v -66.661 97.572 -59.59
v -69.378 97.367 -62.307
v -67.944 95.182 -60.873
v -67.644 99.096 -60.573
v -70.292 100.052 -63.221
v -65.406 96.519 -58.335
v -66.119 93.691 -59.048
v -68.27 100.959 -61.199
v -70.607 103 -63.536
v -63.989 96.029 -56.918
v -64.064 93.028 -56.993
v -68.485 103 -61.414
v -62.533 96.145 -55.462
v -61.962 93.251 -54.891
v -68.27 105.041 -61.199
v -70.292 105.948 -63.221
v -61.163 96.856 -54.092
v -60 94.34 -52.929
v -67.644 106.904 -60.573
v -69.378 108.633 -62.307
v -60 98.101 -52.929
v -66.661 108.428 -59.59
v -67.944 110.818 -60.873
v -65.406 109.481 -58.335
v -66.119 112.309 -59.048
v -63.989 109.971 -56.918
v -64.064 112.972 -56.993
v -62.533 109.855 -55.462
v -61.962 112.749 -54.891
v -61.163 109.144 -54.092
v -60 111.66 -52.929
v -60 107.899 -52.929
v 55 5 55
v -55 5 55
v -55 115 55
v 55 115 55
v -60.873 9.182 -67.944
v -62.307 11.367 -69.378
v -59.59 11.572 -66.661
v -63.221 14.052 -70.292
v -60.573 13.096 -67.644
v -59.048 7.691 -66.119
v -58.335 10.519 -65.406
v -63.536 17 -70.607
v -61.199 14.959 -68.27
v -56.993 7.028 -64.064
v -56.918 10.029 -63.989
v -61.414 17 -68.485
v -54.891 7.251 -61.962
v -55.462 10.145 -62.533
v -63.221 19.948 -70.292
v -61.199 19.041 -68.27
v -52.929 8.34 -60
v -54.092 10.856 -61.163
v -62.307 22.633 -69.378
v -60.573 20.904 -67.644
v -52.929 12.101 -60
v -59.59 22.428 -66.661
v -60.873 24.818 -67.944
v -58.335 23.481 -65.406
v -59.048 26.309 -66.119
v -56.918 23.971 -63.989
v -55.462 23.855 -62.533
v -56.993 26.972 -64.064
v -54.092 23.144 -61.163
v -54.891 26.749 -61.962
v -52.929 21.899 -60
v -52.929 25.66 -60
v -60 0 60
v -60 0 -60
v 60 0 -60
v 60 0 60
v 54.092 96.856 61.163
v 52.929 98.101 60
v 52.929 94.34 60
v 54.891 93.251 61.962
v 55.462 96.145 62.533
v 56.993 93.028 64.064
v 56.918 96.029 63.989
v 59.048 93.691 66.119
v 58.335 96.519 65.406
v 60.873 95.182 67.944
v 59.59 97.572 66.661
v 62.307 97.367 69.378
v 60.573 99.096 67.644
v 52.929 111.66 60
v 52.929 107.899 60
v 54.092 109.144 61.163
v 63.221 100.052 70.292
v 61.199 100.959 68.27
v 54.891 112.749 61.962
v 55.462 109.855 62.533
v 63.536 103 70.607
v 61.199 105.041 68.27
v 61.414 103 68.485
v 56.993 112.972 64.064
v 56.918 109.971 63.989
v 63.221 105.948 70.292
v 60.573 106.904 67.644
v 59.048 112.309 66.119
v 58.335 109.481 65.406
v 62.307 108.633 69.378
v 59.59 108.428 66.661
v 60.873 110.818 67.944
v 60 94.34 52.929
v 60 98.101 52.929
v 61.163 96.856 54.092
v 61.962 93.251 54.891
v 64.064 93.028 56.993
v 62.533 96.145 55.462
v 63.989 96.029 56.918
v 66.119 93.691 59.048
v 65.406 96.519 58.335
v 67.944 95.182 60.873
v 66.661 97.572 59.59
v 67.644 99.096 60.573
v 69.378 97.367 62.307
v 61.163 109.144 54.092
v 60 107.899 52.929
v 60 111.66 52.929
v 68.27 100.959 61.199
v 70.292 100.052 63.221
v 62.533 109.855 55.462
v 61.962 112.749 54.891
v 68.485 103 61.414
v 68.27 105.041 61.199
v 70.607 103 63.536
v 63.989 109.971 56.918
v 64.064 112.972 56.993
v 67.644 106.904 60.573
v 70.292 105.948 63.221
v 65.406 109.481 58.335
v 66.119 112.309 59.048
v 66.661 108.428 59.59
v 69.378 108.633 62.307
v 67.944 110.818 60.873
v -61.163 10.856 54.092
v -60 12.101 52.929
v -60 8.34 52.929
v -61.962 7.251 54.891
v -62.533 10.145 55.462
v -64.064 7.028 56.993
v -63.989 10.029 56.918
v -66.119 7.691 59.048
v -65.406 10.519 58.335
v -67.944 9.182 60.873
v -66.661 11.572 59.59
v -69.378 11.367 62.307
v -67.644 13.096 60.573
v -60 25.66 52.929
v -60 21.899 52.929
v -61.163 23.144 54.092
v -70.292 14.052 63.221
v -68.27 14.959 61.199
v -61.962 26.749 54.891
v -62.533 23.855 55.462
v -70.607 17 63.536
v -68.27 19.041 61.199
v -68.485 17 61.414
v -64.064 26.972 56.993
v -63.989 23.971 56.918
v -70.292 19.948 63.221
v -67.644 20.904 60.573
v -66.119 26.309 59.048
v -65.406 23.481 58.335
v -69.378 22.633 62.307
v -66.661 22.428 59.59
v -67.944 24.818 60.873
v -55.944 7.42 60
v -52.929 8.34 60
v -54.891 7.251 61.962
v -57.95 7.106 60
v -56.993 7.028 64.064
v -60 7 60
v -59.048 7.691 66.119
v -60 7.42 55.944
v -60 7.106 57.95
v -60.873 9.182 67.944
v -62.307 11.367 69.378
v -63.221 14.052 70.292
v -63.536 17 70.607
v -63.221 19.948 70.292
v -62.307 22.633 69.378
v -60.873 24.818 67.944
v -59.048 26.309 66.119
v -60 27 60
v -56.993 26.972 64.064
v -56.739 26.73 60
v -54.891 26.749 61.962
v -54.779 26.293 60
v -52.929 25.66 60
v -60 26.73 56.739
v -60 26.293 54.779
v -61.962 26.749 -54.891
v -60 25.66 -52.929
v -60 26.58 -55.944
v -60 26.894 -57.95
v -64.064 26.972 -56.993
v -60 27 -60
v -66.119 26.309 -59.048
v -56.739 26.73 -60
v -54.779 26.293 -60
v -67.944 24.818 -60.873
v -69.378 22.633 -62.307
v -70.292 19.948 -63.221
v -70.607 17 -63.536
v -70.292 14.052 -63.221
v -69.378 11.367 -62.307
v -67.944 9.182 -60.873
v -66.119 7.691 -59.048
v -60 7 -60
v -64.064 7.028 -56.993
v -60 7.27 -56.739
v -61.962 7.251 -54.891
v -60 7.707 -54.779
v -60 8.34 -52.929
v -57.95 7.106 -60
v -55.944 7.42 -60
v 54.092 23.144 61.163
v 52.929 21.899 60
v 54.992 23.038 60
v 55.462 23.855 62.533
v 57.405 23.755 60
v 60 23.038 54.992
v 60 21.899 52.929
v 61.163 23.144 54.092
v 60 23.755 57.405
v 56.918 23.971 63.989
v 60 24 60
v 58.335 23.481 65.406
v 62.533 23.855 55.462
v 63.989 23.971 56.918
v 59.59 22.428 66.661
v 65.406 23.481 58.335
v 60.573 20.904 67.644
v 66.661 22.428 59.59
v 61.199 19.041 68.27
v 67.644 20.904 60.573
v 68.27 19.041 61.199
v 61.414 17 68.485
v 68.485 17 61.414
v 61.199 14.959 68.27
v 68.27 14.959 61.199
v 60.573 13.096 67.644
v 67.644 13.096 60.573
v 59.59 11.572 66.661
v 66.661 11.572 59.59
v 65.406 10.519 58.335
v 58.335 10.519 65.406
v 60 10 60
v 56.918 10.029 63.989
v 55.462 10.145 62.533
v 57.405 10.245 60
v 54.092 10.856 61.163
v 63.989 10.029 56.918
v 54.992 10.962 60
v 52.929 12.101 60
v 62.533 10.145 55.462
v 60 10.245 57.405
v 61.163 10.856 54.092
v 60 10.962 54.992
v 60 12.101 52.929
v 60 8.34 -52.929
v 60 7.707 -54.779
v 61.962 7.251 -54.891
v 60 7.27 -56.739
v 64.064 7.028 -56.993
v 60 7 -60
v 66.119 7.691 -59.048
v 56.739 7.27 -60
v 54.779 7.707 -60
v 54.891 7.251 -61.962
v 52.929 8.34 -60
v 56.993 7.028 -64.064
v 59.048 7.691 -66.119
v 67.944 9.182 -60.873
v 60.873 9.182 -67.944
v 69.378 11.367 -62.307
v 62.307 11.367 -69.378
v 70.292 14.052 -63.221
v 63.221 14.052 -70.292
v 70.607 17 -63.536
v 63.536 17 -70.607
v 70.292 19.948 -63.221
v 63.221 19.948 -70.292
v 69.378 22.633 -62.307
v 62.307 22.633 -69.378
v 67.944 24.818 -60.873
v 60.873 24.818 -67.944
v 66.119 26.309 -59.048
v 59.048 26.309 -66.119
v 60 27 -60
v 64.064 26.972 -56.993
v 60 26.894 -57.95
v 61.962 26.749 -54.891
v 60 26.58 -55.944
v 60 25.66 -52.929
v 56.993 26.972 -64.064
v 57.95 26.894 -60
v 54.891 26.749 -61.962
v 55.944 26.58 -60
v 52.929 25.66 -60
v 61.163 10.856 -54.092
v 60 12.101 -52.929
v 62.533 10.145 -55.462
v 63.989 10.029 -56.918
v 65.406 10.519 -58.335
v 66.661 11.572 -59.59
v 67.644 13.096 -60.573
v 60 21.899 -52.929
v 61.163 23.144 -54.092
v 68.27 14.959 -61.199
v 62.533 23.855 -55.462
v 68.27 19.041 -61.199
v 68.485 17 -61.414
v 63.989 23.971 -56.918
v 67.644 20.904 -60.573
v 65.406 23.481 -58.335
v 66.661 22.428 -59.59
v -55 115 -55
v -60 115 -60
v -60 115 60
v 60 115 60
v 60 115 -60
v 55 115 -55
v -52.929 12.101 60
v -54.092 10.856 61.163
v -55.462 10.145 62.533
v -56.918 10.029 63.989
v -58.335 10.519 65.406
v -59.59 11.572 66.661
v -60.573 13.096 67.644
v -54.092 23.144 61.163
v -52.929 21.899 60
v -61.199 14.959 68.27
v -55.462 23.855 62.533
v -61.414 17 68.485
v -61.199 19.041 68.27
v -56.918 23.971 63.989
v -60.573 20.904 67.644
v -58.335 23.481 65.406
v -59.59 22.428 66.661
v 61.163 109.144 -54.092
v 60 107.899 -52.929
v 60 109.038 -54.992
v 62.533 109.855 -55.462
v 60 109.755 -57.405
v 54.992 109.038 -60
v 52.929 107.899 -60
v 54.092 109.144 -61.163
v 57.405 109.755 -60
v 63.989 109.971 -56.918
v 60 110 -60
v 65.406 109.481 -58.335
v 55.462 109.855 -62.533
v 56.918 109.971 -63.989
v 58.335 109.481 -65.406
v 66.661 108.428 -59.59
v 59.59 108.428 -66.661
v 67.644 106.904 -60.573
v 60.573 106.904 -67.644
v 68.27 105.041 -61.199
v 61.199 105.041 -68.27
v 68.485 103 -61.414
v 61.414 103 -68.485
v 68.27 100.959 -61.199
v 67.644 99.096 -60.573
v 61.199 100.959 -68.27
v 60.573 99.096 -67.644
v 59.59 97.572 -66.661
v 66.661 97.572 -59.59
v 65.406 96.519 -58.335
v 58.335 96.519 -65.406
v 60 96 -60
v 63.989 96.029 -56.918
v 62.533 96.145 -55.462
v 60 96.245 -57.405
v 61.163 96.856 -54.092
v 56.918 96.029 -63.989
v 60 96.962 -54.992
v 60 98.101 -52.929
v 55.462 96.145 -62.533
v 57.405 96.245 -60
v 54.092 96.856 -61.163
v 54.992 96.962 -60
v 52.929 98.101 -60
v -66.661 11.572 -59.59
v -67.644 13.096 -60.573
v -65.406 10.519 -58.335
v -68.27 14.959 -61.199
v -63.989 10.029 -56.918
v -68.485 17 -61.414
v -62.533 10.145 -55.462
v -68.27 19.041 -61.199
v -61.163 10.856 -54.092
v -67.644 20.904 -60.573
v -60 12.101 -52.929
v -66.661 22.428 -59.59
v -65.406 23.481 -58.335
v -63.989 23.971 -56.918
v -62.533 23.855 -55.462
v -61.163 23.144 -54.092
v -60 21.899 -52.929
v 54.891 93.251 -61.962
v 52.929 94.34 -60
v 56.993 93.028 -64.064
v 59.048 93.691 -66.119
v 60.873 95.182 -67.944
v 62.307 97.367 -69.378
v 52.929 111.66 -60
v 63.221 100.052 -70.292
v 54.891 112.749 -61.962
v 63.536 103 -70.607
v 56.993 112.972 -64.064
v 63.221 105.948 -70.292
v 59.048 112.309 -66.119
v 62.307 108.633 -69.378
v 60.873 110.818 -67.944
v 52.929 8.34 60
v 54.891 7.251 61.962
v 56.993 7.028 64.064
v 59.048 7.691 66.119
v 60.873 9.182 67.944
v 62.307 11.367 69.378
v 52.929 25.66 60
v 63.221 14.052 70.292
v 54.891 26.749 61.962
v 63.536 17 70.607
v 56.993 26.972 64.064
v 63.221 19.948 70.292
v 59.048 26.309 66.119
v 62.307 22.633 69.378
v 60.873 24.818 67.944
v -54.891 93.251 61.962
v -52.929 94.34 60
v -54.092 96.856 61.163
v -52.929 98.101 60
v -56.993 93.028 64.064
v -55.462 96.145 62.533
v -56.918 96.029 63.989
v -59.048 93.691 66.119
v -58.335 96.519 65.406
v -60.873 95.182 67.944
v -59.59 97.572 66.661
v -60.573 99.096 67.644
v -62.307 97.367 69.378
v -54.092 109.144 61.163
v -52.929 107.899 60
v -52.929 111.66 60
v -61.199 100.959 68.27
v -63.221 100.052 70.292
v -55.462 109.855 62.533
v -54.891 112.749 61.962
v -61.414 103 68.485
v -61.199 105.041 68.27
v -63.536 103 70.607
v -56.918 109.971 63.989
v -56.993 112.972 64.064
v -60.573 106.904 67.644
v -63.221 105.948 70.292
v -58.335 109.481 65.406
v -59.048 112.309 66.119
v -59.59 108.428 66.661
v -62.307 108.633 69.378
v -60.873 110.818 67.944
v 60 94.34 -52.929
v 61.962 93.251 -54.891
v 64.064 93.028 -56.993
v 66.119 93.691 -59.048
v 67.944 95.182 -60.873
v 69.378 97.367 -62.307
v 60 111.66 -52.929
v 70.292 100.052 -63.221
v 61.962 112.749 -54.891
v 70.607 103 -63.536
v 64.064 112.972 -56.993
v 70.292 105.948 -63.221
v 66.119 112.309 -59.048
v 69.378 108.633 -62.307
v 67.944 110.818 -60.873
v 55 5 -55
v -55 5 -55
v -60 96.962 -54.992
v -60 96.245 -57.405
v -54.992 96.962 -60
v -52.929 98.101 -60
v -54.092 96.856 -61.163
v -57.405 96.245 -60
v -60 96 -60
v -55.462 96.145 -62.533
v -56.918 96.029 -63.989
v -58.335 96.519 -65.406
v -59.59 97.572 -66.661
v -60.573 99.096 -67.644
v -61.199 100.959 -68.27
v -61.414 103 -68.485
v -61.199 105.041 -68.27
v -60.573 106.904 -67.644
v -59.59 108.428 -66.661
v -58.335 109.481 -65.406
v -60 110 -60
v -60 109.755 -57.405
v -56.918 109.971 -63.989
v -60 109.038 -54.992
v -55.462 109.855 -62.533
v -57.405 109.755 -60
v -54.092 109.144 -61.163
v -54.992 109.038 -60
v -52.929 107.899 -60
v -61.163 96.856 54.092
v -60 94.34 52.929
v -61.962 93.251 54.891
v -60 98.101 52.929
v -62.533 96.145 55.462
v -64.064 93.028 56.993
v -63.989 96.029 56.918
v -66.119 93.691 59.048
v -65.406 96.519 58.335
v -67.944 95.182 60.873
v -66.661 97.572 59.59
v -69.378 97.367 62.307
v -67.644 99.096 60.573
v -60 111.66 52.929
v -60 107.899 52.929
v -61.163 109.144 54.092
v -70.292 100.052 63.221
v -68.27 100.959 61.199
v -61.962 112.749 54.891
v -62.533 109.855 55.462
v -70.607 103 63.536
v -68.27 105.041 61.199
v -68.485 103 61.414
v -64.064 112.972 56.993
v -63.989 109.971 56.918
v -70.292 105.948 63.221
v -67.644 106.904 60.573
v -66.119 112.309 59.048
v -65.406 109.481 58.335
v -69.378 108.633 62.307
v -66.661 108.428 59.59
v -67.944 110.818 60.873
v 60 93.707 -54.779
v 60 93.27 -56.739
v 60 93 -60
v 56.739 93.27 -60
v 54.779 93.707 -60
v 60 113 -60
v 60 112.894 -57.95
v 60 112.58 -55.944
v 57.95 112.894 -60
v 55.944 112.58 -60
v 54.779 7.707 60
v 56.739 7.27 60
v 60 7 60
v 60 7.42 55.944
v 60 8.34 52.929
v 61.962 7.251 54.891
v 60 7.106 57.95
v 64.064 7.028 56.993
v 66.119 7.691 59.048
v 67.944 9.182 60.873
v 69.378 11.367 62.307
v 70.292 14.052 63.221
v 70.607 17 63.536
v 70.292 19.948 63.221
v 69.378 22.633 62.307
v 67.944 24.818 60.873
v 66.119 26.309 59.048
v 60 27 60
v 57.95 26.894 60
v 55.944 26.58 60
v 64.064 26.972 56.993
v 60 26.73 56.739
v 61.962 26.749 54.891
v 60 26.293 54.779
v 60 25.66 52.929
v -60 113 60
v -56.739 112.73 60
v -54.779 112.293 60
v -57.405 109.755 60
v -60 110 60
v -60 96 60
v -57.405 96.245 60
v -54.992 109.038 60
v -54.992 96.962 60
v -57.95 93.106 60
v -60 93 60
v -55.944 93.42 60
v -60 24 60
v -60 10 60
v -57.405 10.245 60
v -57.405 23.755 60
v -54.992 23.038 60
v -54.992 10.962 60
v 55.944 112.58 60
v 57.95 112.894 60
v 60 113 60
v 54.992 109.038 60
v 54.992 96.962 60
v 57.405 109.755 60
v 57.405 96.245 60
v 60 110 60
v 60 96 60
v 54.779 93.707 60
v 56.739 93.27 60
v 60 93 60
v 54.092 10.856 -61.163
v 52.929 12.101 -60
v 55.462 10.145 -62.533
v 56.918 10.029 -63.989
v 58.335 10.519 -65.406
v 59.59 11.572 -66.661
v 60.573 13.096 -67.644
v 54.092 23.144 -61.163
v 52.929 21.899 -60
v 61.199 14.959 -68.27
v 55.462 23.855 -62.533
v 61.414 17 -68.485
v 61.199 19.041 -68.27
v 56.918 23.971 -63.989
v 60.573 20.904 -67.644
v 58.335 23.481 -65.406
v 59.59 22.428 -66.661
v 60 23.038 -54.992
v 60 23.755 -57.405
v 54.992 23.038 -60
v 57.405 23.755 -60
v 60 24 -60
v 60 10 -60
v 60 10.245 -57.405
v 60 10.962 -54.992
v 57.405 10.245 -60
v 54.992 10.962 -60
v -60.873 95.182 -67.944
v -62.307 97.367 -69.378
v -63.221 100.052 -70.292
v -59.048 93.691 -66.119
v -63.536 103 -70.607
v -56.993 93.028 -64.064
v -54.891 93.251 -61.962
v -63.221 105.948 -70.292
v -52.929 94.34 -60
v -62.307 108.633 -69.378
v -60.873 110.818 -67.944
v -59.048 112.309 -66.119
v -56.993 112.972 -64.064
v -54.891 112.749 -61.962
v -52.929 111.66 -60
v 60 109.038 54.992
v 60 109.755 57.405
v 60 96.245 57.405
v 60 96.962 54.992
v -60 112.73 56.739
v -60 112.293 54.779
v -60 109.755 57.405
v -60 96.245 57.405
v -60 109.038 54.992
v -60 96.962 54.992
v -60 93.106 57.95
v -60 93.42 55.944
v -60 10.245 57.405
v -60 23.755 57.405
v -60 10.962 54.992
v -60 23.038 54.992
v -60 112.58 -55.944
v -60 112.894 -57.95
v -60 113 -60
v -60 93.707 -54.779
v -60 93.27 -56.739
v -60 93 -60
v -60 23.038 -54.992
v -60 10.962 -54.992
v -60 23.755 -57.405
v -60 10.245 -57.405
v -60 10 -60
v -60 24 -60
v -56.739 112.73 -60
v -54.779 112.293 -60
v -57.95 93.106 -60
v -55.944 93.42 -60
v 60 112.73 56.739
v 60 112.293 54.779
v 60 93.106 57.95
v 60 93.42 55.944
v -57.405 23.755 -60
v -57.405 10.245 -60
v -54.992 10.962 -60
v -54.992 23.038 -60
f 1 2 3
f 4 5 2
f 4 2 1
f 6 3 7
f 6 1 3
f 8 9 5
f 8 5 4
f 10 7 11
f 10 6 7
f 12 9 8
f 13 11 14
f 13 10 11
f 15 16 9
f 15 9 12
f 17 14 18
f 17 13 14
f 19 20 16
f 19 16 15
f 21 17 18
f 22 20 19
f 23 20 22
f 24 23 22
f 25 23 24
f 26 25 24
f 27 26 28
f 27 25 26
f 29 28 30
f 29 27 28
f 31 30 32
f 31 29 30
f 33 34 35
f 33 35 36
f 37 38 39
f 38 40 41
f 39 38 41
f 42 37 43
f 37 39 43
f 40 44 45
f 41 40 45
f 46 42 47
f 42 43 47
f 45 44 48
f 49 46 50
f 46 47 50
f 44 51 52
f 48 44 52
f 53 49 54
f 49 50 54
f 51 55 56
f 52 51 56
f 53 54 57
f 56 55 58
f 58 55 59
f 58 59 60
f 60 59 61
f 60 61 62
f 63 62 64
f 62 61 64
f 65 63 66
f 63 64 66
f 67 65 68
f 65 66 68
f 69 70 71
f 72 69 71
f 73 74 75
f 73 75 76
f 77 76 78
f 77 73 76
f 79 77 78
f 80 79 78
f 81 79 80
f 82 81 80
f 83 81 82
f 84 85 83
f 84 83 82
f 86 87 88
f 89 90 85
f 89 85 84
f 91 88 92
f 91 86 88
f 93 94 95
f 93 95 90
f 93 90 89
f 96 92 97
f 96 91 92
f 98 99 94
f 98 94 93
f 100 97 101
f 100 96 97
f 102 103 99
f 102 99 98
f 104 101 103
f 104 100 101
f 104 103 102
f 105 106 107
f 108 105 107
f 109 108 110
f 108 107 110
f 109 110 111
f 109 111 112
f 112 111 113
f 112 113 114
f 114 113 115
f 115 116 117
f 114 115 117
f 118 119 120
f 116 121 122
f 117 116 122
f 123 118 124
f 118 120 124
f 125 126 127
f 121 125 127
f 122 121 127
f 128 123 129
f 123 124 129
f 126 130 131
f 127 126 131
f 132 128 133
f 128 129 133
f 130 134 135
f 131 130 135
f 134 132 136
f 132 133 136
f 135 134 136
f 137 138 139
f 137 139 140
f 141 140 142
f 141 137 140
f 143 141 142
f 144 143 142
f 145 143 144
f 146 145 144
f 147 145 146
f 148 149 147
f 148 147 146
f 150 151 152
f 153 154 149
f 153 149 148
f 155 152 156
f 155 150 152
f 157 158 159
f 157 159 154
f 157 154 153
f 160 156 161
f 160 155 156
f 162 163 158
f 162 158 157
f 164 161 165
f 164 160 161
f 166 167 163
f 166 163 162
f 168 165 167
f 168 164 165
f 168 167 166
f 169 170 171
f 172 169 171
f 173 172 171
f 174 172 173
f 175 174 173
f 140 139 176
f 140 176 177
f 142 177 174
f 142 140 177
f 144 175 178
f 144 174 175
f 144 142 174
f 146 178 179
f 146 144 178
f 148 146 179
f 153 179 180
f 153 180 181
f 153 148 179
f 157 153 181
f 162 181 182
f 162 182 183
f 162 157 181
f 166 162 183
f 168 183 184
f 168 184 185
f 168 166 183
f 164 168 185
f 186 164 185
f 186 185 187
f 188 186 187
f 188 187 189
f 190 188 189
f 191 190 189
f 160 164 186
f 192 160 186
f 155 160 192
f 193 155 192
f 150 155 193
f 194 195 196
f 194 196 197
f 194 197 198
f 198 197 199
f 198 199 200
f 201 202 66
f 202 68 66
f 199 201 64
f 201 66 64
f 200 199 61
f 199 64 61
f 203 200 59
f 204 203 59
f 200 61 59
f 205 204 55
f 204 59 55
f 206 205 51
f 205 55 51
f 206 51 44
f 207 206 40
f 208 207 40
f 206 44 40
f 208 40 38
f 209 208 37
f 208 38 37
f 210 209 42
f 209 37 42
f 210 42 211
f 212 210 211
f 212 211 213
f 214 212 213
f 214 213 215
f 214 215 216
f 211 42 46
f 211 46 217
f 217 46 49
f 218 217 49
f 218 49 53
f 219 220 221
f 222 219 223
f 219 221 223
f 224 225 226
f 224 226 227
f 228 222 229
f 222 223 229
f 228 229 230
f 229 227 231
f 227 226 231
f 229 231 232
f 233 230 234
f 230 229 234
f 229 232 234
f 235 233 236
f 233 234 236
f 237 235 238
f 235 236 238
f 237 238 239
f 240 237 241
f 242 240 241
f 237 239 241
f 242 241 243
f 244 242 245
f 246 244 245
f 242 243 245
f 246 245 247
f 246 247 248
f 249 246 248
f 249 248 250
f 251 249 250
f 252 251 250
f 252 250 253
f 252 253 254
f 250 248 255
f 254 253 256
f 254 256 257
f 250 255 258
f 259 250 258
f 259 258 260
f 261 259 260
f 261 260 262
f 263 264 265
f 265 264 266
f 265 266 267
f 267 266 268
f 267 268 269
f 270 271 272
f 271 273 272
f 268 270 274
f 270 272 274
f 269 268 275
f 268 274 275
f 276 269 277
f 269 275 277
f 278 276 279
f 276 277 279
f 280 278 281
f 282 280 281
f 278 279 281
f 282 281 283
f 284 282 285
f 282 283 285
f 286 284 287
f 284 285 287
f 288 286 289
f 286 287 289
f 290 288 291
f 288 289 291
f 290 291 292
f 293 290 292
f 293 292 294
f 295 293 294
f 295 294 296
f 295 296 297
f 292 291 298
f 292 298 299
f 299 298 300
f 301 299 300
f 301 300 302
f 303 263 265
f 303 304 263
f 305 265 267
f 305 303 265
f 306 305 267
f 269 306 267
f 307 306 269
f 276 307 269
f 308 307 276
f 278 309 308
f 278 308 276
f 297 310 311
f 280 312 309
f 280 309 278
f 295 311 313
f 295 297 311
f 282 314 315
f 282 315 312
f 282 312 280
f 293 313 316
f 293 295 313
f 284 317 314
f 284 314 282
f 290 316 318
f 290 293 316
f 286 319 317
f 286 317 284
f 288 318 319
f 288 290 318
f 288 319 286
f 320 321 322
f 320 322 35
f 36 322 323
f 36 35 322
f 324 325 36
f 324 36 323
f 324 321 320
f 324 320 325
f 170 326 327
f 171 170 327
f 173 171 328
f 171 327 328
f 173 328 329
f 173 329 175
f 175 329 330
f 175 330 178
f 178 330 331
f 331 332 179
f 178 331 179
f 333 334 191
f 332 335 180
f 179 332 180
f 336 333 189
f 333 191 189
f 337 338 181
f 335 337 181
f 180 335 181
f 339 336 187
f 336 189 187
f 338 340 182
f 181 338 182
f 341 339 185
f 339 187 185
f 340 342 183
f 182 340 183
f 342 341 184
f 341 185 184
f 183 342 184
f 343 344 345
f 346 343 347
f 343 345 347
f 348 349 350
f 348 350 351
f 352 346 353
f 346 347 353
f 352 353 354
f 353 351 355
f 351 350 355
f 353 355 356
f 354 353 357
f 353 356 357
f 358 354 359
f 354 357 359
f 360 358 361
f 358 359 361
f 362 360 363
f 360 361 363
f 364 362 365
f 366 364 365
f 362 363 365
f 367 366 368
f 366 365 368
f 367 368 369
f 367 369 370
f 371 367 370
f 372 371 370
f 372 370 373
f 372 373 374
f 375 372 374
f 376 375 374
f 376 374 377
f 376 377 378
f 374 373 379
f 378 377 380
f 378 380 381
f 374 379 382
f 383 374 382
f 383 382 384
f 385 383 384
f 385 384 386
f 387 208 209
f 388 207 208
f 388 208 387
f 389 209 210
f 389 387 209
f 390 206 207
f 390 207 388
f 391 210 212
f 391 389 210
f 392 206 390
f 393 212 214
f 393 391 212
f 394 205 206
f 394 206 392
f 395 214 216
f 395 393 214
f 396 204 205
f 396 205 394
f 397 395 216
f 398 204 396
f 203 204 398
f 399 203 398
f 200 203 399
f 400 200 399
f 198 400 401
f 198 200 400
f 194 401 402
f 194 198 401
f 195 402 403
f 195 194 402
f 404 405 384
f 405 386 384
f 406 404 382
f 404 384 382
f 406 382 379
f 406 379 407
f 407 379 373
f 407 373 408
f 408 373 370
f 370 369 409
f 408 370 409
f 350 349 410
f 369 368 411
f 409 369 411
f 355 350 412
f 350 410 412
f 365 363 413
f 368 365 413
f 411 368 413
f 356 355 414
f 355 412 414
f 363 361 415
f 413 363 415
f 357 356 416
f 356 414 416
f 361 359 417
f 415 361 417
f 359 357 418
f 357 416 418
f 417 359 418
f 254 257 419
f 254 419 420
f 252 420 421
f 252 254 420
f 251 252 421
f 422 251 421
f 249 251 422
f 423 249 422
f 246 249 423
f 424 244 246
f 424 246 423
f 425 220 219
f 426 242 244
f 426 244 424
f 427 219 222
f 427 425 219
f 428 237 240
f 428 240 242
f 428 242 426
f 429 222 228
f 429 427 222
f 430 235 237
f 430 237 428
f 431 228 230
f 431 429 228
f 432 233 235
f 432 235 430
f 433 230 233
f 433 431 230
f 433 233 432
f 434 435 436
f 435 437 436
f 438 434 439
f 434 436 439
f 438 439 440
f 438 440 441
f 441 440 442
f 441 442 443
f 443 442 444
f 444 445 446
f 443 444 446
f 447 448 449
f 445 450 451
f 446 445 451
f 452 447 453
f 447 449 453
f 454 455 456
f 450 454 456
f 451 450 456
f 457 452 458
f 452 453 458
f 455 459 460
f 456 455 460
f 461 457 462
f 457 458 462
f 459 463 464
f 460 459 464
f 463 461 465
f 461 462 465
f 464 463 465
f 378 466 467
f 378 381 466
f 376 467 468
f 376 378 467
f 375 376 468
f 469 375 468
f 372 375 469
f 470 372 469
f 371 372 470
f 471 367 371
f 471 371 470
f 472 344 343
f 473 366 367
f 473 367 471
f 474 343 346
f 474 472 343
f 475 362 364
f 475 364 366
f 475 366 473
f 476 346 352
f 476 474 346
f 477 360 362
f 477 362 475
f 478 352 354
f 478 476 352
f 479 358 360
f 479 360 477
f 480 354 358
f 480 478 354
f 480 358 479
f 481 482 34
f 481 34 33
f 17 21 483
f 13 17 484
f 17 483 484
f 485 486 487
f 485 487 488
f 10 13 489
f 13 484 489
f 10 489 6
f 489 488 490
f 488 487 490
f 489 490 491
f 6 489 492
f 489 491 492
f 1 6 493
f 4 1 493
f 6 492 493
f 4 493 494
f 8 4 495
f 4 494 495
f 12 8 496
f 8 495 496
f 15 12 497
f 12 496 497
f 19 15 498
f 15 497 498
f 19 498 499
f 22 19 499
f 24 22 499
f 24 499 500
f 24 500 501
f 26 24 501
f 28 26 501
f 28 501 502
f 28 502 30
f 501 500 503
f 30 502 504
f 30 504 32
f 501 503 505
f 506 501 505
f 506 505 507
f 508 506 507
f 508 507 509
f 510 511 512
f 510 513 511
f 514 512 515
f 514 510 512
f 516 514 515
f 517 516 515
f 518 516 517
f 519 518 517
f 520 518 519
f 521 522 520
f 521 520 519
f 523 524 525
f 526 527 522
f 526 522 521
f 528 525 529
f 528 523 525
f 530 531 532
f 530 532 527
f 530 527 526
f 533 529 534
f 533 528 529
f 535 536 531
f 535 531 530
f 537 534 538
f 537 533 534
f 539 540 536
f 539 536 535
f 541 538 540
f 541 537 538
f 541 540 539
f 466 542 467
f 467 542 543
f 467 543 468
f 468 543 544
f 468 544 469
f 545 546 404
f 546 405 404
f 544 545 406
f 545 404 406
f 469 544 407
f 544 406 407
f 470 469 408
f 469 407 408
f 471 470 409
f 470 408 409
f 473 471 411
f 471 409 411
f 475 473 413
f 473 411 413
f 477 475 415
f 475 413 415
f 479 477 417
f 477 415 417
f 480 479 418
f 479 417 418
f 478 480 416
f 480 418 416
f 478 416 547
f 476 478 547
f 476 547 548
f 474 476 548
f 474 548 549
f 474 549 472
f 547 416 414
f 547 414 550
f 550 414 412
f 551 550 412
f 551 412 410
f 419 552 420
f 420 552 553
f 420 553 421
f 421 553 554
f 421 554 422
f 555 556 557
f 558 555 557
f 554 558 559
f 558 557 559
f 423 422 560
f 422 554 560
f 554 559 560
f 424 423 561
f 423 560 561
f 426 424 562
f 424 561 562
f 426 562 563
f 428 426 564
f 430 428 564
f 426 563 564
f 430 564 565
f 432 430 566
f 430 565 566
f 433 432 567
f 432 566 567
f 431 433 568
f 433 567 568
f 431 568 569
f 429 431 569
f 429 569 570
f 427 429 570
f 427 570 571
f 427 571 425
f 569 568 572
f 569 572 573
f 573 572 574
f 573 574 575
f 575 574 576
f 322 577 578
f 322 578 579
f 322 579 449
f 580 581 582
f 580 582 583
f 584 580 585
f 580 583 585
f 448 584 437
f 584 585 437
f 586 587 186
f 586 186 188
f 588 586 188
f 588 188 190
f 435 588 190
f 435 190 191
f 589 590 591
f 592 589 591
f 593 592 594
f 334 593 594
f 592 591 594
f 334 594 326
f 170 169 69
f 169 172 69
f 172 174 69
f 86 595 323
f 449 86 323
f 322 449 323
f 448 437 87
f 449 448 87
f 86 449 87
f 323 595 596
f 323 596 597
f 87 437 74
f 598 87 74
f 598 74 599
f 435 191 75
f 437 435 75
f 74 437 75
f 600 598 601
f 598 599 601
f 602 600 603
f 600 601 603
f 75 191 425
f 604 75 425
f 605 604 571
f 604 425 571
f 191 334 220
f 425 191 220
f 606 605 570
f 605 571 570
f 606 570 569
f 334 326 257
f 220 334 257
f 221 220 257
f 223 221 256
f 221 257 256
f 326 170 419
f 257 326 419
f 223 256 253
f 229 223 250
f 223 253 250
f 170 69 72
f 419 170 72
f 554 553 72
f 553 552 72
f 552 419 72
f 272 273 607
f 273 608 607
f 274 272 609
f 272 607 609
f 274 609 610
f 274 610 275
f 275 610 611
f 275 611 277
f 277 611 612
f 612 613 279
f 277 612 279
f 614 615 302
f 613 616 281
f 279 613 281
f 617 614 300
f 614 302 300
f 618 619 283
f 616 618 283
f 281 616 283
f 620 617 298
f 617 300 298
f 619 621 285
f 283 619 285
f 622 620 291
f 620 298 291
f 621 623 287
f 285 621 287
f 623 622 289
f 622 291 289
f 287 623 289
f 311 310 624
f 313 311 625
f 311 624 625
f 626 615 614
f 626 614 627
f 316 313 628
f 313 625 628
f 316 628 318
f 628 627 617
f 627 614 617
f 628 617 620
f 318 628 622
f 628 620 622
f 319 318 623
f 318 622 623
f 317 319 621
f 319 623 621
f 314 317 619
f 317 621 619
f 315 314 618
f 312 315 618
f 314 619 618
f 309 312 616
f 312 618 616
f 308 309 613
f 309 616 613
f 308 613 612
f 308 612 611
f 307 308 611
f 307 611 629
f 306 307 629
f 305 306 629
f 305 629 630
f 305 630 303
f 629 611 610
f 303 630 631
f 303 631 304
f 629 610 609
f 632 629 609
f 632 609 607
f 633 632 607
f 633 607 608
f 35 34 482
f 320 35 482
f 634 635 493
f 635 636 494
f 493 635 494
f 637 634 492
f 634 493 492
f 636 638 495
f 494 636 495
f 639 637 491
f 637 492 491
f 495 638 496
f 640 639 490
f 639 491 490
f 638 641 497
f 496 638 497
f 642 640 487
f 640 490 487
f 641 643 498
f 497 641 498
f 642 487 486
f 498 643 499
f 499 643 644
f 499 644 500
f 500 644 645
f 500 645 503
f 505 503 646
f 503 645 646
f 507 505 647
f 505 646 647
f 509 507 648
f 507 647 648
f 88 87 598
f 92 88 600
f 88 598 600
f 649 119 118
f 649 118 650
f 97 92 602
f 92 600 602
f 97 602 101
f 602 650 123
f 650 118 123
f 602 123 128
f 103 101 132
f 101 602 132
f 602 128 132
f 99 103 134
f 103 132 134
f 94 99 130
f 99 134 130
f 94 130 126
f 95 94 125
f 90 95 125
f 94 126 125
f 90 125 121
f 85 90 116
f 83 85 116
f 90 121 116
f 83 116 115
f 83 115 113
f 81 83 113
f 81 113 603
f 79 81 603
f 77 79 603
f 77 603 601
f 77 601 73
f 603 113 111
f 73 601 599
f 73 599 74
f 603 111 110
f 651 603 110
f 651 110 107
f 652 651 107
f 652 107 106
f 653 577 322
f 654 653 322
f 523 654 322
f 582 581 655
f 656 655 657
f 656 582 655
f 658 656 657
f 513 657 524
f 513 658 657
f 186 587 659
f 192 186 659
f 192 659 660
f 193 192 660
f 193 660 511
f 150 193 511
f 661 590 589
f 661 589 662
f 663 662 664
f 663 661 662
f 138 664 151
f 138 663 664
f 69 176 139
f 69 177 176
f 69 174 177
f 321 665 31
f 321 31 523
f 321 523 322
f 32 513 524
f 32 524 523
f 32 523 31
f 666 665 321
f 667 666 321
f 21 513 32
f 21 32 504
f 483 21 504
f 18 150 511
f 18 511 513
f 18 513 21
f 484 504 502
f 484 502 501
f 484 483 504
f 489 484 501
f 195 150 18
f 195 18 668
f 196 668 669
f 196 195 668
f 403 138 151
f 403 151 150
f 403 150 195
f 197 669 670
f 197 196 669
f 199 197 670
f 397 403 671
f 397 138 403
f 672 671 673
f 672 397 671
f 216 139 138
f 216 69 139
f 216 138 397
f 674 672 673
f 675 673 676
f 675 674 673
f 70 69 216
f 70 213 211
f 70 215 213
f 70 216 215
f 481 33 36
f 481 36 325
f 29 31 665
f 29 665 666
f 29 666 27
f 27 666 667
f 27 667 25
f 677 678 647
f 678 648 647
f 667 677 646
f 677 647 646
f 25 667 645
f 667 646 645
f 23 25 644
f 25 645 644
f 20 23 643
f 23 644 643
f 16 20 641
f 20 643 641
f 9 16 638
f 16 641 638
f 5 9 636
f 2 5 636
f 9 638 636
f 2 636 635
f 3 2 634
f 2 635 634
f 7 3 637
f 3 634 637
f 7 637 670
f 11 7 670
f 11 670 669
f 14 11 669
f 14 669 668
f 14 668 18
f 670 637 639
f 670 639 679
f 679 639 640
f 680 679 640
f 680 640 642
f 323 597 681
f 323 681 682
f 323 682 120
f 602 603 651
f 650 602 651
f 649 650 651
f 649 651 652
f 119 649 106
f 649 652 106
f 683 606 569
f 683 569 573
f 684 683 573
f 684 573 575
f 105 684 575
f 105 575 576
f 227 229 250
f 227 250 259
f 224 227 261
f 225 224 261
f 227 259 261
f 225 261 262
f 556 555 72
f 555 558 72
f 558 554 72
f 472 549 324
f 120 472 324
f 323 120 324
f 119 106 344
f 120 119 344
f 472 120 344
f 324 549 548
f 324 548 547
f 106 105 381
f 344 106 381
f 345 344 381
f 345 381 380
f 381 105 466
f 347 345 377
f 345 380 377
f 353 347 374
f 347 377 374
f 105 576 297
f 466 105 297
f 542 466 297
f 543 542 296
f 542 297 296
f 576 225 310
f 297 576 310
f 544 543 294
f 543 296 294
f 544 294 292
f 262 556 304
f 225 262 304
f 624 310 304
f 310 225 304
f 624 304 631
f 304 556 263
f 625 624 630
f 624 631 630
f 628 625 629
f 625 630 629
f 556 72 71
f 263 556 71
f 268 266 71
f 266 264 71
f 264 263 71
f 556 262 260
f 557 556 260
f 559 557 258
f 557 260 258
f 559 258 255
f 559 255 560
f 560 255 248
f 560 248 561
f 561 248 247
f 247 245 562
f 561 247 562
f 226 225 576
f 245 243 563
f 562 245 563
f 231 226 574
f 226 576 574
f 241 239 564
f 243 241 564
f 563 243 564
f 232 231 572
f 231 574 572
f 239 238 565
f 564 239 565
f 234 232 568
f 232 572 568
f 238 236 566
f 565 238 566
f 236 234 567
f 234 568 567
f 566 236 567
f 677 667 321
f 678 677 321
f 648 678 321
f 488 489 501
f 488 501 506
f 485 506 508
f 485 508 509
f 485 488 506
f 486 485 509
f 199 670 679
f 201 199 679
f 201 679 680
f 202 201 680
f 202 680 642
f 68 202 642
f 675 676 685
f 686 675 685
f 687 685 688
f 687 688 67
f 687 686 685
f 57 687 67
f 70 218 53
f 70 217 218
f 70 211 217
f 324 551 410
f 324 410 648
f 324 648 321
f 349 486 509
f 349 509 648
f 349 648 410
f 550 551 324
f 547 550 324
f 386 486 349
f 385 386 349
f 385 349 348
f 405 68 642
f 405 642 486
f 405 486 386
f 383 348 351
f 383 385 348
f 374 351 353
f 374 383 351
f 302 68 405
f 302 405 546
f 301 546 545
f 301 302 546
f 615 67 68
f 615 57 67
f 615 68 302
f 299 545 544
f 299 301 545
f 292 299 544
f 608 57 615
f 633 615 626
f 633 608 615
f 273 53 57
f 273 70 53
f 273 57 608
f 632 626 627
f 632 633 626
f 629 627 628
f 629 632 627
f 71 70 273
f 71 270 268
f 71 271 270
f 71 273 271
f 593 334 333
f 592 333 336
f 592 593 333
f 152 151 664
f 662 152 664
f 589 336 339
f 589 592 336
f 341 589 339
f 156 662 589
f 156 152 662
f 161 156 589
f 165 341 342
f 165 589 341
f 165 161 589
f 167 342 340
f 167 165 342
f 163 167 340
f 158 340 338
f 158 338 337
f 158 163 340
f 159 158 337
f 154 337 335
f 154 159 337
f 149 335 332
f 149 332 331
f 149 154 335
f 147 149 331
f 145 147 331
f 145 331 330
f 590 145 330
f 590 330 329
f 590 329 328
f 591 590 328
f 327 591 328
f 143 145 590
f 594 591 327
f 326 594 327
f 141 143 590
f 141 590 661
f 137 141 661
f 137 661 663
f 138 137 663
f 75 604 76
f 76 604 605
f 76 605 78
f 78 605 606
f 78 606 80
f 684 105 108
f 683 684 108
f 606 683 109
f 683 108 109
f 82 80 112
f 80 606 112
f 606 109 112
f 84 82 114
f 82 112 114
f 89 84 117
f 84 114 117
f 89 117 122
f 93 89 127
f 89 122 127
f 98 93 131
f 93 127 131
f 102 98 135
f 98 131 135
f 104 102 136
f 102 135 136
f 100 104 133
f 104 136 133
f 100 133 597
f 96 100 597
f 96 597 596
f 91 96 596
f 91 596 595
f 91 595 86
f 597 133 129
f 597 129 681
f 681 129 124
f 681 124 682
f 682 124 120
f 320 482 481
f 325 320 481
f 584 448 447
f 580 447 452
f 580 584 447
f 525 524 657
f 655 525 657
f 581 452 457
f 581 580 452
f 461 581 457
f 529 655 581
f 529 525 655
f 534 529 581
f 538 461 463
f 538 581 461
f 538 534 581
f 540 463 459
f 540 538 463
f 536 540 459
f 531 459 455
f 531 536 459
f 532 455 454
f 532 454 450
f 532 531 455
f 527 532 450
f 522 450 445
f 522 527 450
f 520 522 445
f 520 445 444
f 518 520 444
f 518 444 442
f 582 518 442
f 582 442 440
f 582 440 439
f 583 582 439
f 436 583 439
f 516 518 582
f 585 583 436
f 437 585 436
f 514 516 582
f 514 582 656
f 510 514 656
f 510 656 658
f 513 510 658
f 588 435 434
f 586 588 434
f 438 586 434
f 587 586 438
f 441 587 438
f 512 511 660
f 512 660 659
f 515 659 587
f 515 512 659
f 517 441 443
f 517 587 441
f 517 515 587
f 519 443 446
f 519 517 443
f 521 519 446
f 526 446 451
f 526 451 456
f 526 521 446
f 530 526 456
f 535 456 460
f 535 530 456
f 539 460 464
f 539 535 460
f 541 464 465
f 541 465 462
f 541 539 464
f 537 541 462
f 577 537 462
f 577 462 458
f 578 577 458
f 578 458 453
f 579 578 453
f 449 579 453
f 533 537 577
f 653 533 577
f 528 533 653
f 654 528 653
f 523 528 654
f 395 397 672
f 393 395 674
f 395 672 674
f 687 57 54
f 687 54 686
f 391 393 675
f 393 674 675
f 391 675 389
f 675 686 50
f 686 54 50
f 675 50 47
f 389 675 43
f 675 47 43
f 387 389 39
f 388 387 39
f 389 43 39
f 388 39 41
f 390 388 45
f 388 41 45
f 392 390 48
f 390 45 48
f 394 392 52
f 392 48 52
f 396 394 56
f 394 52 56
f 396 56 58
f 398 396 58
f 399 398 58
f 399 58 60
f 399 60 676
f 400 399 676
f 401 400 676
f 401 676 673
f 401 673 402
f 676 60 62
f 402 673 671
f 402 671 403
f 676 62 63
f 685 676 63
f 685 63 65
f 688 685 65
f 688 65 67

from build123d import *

# Parameters (mm, degrees)
SKETCH1_W                = 120
SKETCH1_H                = 120
BOSS_EXTRUDE1_DEPTH      = 115
SHELL1_T                 = -5
BOSS_EXTRUDE2_DEPTH      = 5
BOSS_EXTRUDE2_DEPTH_BACK = 5
BOSS_EXTRUDE3_DEPTH      = 5
BOSS_EXTRUDE3_DEPTH_BACK = 5


with BuildPart() as part:
    # Sketch1 → Boss-Extrude1 (new body)
    with BuildSketch(Plane(origin=(0, 0, 0), x_dir=(1, 0, 0), z_dir=(0, 1, 0))):
        Rectangle(SKETCH1_W, SKETCH1_H)
    extrude(amount=BOSS_EXTRUDE1_DEPTH)

    # Shell1
    shell1_openings = [part.faces().sort_by_distance(p)[0] for p in [
        (0, 115, 0),
    ]]
    offset(amount=SHELL1_T, openings=shell1_openings, kind=Kind.INTERSECTION)

    # Sketch2 → Boss-Extrude2 (add, two sides: drawn at the far end of the back side and taken through both)
    with BuildSketch(Plane(origin=(0, 0, 0), x_dir=(0.7071067811865475, 0, 0.7071067811865477), z_dir=(-0.7071067811865477, 0, 0.7071067811865475)).offset(-BOSS_EXTRUDE2_DEPTH_BACK)):
        with BuildLine():
            Line((-78.852813742, 20.605551275), (-78.852813742, 25))
            ThreePointArc((-78.852813742, 25), (-94.852813742, 17), (-78.852813742, 9))
            Line((-78.852813742, 9), (-78.852813742, 13.394448725))
            ThreePointArc((-78.852813742, 13.394448725), (-91.852813742, 17), (-78.852813742, 20.605551275))
        make_face()
        with BuildLine():
            Line((-78.852813742, 106.605551275), (-78.852813742, 111))
            ThreePointArc((-78.852813742, 111), (-94.852813742, 103), (-78.852813742, 95))
            Line((-78.852813742, 95), (-78.852813742, 99.394448725))
            ThreePointArc((-78.852813742, 99.394448725), (-91.852813742, 103), (-78.852813742, 106.605551275))
        make_face()
        with BuildLine():
            ThreePointArc((78.852813742, 95), (94.852813742, 103), (78.852813742, 111))
            Line((78.852813742, 111), (78.852813742, 106.605551275))
            ThreePointArc((78.852813742, 106.605551275), (91.852813742, 103), (78.852813742, 99.394448725))
            Line((78.852813742, 99.394448725), (78.852813742, 95))
        make_face()
        with BuildLine():
            ThreePointArc((78.852813742, 9), (94.852813742, 17), (78.852813742, 25))
            Line((78.852813742, 25), (78.852813742, 20.605551275))
            ThreePointArc((78.852813742, 20.605551275), (91.852813742, 17), (78.852813742, 13.394448725))
            Line((78.852813742, 13.394448725), (78.852813742, 9))
        make_face()
    extrude(amount=BOSS_EXTRUDE2_DEPTH + BOSS_EXTRUDE2_DEPTH_BACK)

    # Sketch3 → Boss-Extrude3 (add, two sides: drawn at the far end of the back side and taken through both)
    with BuildSketch(Plane(origin=(0, 0, 0), x_dir=(0.7071067811865475, 0, -0.7071067811865476), z_dir=(0.7071067811865476, 0, 0.7071067811865475)).offset(-BOSS_EXTRUDE3_DEPTH_BACK)):
        with BuildLine():
            Line((-78.852813742, 111), (-78.852813742, 106.605551275))
            ThreePointArc((-78.852813742, 106.605551275), (-91.852813742, 103), (-78.852813742, 99.394448725))
            Line((-78.852813742, 99.394448725), (-78.852813742, 95))
            ThreePointArc((-78.852813742, 95), (-94.852813742, 103), (-78.852813742, 111))
        make_face()
        with BuildLine():
            Line((78.852813742, 111), (78.852813742, 106.605551275))
            ThreePointArc((78.852813742, 106.605551275), (91.852813742, 103), (78.852813742, 99.394448725))
            Line((78.852813742, 99.394448725), (78.852813742, 95))
            ThreePointArc((78.852813742, 95), (94.852813742, 103), (78.852813742, 111))
        make_face()
        with BuildLine():
            Line((-78.852813742, 13.394448725), (-78.852813742, 9))
            ThreePointArc((-78.852813742, 9), (-94.852813742, 17), (-78.852813742, 25))
            Line((-78.852813742, 25), (-78.852813742, 20.605551275))
            ThreePointArc((-78.852813742, 20.605551275), (-91.852813742, 17), (-78.852813742, 13.394448725))
        make_face()
        with BuildLine():
            Line((78.852813742, 25), (78.852813742, 20.605551275))
            ThreePointArc((78.852813742, 20.605551275), (91.852813742, 17), (78.852813742, 13.394448725))
            Line((78.852813742, 13.394448725), (78.852813742, 9))
            ThreePointArc((78.852813742, 9), (94.852813742, 17), (78.852813742, 25))
        make_face()
    extrude(amount=BOSS_EXTRUDE3_DEPTH + BOSS_EXTRUDE3_DEPTH_BACK)


solid = part.part
